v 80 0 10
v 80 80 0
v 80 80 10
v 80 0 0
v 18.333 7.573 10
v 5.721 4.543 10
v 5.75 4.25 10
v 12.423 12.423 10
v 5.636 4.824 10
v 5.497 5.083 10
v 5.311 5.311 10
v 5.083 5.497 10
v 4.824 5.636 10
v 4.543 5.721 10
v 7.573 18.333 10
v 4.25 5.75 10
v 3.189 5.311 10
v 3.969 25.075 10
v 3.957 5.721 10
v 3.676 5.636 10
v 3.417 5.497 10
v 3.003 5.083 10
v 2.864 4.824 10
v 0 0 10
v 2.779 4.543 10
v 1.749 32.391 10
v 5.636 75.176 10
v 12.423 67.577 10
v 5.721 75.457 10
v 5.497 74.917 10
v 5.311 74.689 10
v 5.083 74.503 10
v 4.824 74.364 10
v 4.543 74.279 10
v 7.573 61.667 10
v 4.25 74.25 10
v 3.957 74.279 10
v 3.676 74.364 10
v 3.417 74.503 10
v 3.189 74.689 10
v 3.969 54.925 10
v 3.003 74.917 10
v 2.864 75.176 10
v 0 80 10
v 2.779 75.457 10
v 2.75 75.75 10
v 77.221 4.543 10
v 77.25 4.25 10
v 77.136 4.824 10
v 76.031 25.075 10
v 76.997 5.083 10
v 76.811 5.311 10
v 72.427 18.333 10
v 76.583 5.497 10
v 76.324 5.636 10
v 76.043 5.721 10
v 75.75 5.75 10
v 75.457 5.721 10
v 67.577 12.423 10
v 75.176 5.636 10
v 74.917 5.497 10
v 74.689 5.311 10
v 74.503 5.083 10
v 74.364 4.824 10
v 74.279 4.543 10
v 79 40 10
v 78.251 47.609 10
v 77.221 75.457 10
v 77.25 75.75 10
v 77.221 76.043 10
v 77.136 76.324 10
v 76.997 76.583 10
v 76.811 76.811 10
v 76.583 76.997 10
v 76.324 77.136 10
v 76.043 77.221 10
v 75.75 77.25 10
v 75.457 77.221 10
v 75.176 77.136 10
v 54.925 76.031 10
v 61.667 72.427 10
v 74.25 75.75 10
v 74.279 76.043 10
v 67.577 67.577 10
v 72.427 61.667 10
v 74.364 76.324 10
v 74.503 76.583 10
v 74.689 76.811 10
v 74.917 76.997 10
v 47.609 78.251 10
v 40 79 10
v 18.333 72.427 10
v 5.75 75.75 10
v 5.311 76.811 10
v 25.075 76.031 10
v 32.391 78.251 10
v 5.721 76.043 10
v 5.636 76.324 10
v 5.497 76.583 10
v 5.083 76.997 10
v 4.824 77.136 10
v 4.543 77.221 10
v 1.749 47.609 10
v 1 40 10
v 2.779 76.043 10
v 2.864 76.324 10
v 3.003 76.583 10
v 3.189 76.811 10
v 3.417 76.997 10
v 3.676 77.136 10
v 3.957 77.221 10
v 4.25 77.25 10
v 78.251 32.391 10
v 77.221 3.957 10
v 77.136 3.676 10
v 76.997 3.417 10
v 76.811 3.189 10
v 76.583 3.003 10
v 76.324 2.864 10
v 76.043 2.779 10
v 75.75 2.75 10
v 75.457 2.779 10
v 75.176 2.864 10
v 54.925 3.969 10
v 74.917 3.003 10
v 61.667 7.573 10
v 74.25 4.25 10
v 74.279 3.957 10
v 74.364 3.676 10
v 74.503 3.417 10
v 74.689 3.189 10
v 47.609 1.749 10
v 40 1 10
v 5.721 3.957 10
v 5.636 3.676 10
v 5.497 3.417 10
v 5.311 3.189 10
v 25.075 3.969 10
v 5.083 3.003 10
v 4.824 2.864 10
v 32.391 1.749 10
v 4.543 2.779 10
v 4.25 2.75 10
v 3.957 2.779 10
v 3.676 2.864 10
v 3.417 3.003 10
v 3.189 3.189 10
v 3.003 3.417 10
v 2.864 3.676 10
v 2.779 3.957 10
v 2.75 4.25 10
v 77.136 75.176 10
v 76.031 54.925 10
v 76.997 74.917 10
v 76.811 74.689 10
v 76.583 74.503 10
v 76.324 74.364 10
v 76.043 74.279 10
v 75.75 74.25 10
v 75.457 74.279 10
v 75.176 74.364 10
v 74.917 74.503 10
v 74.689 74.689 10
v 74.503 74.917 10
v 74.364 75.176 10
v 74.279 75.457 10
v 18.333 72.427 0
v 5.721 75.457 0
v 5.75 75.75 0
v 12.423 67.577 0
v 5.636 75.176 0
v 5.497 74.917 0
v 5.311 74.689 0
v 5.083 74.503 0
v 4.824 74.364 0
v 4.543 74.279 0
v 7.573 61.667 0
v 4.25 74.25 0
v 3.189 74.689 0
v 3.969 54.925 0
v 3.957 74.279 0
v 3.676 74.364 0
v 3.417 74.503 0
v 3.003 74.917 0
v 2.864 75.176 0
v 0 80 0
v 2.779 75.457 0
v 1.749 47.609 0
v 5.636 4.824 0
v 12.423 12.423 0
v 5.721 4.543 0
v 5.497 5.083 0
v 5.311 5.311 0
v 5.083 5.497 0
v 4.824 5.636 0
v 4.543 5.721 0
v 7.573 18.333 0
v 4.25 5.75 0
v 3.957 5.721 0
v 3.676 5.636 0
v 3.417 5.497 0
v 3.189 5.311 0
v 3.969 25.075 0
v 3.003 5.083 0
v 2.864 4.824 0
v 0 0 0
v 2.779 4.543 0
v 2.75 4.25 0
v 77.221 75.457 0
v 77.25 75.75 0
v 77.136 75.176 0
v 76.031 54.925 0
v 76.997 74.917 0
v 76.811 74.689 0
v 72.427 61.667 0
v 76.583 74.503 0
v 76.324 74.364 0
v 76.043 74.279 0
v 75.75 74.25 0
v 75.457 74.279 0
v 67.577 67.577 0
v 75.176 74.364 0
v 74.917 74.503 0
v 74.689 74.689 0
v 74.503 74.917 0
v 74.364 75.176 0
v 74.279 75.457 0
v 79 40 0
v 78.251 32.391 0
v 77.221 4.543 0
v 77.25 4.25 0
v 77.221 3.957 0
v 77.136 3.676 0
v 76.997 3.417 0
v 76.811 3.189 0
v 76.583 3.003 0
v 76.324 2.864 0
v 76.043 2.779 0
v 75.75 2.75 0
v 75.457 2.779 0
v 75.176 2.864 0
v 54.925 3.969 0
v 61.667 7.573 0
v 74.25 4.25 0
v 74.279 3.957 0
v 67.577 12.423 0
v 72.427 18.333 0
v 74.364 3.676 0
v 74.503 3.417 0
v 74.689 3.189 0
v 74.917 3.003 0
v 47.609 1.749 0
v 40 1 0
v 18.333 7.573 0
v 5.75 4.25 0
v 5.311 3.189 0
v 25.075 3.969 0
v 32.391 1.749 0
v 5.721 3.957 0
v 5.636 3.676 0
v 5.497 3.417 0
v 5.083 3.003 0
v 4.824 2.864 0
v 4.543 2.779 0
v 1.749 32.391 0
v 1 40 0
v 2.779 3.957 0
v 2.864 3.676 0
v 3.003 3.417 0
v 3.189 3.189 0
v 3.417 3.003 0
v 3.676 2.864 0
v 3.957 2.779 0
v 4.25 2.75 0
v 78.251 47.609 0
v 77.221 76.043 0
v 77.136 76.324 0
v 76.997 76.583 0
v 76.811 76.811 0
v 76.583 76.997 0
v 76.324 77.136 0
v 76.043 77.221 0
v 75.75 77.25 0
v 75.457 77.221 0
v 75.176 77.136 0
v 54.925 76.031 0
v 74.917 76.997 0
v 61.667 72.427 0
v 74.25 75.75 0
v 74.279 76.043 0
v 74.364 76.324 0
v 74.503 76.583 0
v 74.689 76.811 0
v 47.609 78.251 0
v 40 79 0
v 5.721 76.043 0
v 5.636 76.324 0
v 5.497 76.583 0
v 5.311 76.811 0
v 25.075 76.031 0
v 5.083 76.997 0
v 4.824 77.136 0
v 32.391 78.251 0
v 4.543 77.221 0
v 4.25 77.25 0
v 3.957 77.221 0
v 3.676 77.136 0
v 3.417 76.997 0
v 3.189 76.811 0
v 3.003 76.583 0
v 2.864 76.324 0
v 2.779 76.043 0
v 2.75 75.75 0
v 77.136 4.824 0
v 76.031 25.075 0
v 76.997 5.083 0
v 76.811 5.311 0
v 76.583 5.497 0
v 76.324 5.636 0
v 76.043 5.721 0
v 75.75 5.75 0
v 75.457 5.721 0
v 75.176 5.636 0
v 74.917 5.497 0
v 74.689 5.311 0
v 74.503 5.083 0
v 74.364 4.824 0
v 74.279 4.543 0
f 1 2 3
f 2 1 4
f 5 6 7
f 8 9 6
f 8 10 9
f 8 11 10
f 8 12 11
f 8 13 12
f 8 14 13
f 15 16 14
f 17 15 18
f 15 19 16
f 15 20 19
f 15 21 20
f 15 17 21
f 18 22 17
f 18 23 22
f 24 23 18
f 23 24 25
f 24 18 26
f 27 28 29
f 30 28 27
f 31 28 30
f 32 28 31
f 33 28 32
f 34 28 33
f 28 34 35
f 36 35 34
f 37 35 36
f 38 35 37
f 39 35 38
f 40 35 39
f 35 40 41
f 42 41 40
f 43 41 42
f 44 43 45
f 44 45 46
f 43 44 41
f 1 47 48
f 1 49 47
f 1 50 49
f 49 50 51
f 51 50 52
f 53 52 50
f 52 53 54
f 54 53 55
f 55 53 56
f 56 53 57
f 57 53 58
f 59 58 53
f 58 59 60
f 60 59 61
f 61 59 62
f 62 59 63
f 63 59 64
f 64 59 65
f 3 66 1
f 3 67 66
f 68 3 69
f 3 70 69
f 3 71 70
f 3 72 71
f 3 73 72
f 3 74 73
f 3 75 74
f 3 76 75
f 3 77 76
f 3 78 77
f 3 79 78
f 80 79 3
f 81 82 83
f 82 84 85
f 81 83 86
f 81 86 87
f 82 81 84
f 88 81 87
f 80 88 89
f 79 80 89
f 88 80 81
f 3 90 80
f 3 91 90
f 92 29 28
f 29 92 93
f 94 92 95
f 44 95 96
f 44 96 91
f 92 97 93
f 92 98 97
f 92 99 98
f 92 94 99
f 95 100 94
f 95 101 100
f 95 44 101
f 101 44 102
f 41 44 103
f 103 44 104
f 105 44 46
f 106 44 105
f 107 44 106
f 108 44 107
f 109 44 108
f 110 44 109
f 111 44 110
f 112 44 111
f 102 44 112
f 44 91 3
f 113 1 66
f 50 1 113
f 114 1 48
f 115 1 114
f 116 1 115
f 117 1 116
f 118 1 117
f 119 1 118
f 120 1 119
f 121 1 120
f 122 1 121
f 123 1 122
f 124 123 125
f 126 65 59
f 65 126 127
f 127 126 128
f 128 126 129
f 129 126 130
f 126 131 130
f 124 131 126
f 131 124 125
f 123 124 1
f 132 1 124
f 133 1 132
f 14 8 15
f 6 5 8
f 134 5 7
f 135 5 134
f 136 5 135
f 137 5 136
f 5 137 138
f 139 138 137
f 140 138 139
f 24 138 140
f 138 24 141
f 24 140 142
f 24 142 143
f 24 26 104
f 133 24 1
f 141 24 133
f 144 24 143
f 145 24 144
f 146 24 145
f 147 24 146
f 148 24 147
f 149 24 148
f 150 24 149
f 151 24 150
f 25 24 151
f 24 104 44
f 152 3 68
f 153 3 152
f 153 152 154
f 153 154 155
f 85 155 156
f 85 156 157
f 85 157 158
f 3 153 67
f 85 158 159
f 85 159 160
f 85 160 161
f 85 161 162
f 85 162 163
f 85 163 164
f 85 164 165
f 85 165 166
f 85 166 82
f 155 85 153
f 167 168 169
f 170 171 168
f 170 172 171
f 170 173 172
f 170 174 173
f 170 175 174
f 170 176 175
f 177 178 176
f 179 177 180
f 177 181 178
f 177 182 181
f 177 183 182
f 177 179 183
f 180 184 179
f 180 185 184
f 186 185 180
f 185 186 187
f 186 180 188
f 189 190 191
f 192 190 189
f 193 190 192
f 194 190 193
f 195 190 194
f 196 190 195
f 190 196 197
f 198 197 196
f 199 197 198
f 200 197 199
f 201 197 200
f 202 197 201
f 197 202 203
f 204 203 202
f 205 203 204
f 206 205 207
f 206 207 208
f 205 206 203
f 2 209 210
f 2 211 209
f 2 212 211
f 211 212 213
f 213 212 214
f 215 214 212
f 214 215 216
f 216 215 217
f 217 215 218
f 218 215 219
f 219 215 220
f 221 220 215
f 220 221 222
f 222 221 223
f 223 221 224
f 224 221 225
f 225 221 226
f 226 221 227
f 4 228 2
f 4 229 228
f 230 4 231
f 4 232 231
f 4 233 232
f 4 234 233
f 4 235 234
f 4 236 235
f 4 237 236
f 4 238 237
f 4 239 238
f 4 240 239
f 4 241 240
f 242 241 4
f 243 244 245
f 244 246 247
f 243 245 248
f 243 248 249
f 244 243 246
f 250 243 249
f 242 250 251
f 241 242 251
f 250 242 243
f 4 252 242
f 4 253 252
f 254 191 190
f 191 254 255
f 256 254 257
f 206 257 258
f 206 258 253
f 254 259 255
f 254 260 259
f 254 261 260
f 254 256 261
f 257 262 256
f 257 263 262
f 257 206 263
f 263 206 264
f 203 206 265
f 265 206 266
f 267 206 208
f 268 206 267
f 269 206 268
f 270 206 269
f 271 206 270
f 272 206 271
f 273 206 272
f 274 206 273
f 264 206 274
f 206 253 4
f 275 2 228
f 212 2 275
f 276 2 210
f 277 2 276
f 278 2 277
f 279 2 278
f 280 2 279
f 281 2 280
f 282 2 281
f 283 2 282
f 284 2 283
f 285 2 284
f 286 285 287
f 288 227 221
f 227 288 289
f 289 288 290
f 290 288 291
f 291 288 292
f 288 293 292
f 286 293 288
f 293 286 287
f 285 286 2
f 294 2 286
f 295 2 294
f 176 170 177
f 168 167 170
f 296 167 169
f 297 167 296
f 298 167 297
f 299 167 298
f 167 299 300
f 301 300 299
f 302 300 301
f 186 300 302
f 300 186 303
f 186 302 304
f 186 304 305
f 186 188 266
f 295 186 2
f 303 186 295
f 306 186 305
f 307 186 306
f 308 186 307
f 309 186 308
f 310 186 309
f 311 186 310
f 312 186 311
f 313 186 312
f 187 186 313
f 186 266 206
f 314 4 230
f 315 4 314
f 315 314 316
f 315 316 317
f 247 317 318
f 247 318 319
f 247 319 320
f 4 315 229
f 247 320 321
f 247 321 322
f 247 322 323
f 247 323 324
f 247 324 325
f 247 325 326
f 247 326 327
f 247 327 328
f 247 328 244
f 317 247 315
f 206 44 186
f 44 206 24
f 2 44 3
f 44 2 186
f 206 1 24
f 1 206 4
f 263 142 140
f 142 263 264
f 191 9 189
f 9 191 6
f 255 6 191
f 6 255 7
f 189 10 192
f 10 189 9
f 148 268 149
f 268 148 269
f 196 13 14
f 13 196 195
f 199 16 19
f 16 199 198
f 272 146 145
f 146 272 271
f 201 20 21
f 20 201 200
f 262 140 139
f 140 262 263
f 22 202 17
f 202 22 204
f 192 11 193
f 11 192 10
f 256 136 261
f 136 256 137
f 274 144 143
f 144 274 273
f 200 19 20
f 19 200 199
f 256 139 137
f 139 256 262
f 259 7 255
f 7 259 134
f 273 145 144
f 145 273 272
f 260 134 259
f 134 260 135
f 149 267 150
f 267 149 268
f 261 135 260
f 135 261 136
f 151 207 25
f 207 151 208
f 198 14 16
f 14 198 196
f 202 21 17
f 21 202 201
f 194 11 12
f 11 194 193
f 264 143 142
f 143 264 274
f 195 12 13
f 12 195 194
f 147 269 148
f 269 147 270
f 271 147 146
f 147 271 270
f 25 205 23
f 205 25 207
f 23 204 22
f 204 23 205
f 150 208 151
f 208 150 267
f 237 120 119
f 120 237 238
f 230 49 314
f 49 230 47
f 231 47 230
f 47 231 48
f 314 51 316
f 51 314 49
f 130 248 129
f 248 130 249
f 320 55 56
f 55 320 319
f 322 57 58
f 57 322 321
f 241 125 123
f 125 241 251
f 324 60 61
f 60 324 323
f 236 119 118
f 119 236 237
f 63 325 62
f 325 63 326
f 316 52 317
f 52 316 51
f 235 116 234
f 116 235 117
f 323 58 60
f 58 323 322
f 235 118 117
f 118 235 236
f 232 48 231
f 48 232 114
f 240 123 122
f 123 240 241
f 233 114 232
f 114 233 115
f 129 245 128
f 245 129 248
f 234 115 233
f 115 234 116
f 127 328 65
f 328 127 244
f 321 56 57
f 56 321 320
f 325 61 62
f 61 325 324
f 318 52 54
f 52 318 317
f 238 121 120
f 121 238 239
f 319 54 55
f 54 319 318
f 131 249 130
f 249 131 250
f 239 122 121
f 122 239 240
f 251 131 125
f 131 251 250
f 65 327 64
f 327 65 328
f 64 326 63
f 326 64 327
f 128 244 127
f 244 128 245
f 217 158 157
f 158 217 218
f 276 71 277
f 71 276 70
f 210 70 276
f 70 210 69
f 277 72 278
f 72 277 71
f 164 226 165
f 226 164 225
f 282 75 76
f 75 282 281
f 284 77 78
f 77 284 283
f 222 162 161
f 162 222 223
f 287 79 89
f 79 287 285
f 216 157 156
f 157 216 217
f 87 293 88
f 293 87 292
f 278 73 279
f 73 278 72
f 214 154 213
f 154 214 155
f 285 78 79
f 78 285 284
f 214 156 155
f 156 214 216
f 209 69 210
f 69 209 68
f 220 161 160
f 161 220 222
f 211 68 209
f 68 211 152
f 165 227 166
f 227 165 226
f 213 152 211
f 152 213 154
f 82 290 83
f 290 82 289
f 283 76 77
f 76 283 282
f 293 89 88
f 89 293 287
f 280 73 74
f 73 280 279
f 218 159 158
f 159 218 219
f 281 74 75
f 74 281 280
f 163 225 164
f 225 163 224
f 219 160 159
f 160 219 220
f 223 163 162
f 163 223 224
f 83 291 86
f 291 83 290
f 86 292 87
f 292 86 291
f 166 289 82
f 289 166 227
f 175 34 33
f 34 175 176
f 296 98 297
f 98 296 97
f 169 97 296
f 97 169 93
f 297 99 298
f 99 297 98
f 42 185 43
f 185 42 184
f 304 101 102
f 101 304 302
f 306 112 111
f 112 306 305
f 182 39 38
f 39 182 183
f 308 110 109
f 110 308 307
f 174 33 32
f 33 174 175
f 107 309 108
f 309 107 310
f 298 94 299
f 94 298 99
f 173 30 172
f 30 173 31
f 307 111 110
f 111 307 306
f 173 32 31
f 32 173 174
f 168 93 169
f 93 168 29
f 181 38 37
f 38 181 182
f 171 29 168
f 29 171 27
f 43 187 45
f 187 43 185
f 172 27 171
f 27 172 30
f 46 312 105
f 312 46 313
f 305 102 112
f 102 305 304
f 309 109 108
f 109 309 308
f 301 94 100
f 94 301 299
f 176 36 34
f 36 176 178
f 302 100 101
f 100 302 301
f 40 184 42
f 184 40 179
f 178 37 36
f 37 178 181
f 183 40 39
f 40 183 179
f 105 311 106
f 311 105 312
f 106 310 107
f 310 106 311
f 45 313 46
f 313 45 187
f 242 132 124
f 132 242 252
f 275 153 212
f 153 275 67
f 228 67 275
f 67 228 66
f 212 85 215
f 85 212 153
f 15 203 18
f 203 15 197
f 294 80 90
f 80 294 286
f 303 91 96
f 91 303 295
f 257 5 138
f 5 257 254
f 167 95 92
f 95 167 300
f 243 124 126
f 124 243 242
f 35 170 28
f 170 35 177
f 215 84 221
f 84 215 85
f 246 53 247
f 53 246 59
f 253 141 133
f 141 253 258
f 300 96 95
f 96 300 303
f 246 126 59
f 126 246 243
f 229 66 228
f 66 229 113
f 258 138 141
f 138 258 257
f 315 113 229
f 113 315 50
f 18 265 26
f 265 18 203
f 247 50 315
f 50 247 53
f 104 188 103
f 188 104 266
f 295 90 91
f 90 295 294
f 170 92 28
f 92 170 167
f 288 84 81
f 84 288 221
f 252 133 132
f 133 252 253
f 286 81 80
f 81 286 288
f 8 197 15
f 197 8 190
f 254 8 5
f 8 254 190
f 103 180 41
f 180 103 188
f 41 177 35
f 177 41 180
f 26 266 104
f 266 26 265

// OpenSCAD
$fn=32;

w=80;
hd=71.5;
o=(80-71.5)/2;

difference() {
  cube([w,w,10]);
  translate([o,o,-0.1]) cylinder(r=1.5,h=10.2);
  translate([hd+o,o,-0.1]) cylinder(r=1.5,h=10.2);
  translate([hd+o,hd+o,-0.1]) cylinder(r=1.5,h=10.2);
  translate([o,hd+o,-0.1]) cylinder(r=1.5,h=10.2);
  translate([w/2,w/2,-0.1]) cylinder(r=w/2-1,h=10.2);
}
